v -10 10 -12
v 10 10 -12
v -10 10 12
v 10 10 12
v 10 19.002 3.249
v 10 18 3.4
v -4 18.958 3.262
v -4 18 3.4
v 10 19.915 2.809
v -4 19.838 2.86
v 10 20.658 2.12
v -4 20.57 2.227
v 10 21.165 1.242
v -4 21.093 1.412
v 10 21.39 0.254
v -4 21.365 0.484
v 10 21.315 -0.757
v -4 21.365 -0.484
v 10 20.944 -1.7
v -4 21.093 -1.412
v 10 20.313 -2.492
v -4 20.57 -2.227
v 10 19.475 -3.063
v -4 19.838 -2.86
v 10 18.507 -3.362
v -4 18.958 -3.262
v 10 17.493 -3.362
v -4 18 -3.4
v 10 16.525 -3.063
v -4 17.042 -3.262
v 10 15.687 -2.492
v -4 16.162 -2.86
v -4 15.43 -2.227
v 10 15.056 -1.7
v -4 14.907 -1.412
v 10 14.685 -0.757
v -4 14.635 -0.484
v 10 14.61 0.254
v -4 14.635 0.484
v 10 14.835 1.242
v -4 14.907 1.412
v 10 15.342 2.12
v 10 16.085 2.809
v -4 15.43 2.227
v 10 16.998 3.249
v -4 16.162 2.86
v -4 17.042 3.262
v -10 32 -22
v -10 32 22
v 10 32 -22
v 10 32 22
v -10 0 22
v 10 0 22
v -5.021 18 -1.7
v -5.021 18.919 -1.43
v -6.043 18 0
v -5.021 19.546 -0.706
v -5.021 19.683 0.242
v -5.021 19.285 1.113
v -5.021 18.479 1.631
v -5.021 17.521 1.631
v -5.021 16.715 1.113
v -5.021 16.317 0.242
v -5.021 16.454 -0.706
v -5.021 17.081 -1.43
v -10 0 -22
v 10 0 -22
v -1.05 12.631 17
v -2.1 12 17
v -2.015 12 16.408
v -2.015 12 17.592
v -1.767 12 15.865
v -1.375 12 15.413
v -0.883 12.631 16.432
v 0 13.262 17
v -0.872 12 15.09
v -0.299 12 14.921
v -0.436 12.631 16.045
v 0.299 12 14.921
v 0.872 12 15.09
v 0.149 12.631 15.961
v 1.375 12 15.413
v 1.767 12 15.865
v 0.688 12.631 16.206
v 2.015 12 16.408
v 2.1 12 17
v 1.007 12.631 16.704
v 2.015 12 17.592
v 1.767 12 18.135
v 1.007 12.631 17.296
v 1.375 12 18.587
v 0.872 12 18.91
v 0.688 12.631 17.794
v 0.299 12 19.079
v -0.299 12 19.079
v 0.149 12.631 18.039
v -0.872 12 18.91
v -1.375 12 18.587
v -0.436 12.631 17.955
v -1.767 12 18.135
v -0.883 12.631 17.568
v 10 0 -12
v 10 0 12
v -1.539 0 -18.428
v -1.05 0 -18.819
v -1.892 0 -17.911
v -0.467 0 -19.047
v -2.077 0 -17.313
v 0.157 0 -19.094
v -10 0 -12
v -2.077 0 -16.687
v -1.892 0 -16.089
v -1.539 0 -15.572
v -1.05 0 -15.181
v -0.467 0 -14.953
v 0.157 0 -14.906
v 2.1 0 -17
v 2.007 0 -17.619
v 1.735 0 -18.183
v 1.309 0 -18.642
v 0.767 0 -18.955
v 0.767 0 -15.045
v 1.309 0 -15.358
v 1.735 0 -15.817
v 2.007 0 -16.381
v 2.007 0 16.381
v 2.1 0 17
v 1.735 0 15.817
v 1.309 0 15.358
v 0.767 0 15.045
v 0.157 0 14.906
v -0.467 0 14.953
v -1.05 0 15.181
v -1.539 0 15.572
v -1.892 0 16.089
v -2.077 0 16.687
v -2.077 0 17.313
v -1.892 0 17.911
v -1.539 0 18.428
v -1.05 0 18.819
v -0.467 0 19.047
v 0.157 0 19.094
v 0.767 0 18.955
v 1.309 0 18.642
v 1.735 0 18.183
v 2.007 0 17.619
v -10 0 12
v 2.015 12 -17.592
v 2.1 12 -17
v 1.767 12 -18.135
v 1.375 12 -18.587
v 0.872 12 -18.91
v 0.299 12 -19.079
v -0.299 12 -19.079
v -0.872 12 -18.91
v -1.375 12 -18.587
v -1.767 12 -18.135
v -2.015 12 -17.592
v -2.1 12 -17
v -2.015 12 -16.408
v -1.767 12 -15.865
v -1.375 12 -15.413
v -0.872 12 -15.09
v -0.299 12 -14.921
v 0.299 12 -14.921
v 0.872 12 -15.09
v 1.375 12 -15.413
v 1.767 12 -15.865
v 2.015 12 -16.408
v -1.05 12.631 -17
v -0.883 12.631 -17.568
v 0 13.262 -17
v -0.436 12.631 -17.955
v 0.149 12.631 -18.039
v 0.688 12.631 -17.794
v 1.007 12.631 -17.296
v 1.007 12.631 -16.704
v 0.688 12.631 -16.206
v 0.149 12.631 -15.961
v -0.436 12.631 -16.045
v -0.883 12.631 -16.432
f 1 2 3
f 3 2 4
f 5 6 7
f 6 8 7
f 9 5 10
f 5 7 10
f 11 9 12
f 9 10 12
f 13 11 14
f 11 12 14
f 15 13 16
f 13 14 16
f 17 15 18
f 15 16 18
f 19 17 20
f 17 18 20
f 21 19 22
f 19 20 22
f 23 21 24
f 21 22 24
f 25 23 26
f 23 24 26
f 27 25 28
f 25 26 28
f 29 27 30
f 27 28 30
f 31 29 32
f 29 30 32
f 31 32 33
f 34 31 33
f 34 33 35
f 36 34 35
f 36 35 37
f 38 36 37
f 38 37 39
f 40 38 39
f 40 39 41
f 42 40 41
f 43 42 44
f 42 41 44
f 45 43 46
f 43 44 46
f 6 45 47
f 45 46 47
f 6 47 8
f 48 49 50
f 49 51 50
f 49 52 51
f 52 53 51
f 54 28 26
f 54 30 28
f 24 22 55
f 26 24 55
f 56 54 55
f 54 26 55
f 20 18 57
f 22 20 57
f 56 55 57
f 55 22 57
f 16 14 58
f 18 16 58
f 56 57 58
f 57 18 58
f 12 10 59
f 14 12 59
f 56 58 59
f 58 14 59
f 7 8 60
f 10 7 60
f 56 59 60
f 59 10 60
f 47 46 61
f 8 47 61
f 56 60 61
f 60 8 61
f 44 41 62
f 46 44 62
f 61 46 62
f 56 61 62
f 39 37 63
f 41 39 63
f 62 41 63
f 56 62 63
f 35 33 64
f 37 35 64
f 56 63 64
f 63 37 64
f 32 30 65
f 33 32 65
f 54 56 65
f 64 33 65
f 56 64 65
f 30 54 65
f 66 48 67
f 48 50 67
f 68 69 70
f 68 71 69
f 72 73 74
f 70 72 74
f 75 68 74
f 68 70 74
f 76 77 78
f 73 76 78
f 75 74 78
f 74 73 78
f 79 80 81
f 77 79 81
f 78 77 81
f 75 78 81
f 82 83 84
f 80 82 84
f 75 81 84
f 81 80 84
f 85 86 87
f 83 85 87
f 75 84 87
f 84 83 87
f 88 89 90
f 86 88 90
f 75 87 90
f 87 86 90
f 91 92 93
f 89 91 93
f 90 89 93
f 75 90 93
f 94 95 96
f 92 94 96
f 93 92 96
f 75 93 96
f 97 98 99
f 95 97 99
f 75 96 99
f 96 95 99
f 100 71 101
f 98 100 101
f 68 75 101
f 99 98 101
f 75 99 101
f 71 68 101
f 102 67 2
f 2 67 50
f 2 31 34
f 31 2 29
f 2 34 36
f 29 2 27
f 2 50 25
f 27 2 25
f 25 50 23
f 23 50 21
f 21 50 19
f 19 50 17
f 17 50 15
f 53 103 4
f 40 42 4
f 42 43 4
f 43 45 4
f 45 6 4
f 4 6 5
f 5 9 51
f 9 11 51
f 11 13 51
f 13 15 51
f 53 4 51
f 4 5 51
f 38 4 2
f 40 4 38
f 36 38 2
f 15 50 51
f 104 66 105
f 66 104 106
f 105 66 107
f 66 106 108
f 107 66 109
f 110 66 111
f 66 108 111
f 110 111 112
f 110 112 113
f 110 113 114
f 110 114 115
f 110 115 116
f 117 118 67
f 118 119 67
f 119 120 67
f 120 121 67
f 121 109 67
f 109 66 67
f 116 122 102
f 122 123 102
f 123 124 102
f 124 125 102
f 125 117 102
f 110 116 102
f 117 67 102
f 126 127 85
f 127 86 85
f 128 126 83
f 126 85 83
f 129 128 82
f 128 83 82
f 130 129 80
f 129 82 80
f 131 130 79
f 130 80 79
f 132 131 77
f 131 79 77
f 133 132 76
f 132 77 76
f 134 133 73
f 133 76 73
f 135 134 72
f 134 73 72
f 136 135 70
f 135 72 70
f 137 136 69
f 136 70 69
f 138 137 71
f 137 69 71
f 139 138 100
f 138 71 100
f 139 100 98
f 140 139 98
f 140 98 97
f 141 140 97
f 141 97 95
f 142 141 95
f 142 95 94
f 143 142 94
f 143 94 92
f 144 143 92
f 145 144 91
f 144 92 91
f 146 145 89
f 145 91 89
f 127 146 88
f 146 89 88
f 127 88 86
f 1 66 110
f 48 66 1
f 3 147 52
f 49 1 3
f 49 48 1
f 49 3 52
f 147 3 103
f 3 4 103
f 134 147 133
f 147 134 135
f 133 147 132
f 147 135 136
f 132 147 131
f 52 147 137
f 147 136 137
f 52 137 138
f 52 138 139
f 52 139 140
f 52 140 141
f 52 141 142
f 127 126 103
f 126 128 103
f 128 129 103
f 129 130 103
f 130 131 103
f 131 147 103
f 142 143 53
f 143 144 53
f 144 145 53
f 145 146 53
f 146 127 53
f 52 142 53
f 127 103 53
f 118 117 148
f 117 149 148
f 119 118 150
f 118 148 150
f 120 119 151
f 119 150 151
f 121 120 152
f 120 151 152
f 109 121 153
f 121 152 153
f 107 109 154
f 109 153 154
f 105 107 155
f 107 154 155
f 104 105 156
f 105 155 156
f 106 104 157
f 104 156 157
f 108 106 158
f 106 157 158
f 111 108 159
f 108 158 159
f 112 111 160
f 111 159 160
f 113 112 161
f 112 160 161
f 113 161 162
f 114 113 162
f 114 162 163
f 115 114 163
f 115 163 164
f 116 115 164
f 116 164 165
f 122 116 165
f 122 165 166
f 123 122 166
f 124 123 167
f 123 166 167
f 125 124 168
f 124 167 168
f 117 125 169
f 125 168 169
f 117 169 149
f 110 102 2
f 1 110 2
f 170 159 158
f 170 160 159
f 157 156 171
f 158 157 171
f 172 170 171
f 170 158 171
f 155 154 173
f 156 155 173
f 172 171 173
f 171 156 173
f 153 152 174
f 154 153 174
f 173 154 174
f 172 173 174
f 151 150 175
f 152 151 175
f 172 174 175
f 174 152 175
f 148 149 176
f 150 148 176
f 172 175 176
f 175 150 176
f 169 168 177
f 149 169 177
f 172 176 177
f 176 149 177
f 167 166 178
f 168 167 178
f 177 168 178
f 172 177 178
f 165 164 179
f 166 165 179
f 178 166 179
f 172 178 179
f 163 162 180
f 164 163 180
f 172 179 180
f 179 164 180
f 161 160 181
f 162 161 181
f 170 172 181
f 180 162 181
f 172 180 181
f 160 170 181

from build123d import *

# Parameters (mm, degrees)
BOSS_EXTRUDE1_DEPTH   = 10
M8_TAPPED_HOLE1_D     = 6.8
M8_TAPPED_HOLE1_DEPTH = 14
M8_TAPPED_HOLE1_TIP   = 2.042926105
M5_TAPPED_HOLE1_D     = 4.2
M5_TAPPED_HOLE1_DEPTH = 12
M5_TAPPED_HOLE1_TIP   = 1.2618073


with BuildPart() as part:
    # Sketch1 → Boss-Extrude1 (new, symmetric)
    with BuildSketch(Plane(origin=(0, 0, 0), x_dir=(0, 0, -1), z_dir=(1, 0, 0))):
        Polygon((12, 10), (-12, 10), (-12, 0), (-22, 0), (-22, 32), (22, 32), (22, 0), (12, 0), align=None)
    extrude(amount=BOSS_EXTRUDE1_DEPTH, both=True)

    # M8 Tapped Hole1
    with Locations(Plane(origin=(10, 0, 0), x_dir=(0, 0, -1), z_dir=(1, 0, 0))):
        with Locations((0, 18)):
            Hole(M8_TAPPED_HOLE1_D / 2, depth=M8_TAPPED_HOLE1_DEPTH)
            with Locations((0, 0, -(M8_TAPPED_HOLE1_DEPTH + M8_TAPPED_HOLE1_TIP / 2))):  # 118° drill point
                Cone(0, M8_TAPPED_HOLE1_D / 2, M8_TAPPED_HOLE1_TIP, mode=Mode.SUBTRACT)

    # M5 Tapped Hole1
    with Locations(Plane(origin=(0, 0, 0), x_dir=(-1, 0, 0), z_dir=(0, -1, 0))):
        with Locations((0, 17), (0, -17)):
            Hole(M5_TAPPED_HOLE1_D / 2, depth=M5_TAPPED_HOLE1_DEPTH)
            with Locations((0, 0, -(M5_TAPPED_HOLE1_DEPTH + M5_TAPPED_HOLE1_TIP / 2))):  # 118° drill point
                Cone(0, M5_TAPPED_HOLE1_D / 2, M5_TAPPED_HOLE1_TIP, mode=Mode.SUBTRACT)


solid = part.part
